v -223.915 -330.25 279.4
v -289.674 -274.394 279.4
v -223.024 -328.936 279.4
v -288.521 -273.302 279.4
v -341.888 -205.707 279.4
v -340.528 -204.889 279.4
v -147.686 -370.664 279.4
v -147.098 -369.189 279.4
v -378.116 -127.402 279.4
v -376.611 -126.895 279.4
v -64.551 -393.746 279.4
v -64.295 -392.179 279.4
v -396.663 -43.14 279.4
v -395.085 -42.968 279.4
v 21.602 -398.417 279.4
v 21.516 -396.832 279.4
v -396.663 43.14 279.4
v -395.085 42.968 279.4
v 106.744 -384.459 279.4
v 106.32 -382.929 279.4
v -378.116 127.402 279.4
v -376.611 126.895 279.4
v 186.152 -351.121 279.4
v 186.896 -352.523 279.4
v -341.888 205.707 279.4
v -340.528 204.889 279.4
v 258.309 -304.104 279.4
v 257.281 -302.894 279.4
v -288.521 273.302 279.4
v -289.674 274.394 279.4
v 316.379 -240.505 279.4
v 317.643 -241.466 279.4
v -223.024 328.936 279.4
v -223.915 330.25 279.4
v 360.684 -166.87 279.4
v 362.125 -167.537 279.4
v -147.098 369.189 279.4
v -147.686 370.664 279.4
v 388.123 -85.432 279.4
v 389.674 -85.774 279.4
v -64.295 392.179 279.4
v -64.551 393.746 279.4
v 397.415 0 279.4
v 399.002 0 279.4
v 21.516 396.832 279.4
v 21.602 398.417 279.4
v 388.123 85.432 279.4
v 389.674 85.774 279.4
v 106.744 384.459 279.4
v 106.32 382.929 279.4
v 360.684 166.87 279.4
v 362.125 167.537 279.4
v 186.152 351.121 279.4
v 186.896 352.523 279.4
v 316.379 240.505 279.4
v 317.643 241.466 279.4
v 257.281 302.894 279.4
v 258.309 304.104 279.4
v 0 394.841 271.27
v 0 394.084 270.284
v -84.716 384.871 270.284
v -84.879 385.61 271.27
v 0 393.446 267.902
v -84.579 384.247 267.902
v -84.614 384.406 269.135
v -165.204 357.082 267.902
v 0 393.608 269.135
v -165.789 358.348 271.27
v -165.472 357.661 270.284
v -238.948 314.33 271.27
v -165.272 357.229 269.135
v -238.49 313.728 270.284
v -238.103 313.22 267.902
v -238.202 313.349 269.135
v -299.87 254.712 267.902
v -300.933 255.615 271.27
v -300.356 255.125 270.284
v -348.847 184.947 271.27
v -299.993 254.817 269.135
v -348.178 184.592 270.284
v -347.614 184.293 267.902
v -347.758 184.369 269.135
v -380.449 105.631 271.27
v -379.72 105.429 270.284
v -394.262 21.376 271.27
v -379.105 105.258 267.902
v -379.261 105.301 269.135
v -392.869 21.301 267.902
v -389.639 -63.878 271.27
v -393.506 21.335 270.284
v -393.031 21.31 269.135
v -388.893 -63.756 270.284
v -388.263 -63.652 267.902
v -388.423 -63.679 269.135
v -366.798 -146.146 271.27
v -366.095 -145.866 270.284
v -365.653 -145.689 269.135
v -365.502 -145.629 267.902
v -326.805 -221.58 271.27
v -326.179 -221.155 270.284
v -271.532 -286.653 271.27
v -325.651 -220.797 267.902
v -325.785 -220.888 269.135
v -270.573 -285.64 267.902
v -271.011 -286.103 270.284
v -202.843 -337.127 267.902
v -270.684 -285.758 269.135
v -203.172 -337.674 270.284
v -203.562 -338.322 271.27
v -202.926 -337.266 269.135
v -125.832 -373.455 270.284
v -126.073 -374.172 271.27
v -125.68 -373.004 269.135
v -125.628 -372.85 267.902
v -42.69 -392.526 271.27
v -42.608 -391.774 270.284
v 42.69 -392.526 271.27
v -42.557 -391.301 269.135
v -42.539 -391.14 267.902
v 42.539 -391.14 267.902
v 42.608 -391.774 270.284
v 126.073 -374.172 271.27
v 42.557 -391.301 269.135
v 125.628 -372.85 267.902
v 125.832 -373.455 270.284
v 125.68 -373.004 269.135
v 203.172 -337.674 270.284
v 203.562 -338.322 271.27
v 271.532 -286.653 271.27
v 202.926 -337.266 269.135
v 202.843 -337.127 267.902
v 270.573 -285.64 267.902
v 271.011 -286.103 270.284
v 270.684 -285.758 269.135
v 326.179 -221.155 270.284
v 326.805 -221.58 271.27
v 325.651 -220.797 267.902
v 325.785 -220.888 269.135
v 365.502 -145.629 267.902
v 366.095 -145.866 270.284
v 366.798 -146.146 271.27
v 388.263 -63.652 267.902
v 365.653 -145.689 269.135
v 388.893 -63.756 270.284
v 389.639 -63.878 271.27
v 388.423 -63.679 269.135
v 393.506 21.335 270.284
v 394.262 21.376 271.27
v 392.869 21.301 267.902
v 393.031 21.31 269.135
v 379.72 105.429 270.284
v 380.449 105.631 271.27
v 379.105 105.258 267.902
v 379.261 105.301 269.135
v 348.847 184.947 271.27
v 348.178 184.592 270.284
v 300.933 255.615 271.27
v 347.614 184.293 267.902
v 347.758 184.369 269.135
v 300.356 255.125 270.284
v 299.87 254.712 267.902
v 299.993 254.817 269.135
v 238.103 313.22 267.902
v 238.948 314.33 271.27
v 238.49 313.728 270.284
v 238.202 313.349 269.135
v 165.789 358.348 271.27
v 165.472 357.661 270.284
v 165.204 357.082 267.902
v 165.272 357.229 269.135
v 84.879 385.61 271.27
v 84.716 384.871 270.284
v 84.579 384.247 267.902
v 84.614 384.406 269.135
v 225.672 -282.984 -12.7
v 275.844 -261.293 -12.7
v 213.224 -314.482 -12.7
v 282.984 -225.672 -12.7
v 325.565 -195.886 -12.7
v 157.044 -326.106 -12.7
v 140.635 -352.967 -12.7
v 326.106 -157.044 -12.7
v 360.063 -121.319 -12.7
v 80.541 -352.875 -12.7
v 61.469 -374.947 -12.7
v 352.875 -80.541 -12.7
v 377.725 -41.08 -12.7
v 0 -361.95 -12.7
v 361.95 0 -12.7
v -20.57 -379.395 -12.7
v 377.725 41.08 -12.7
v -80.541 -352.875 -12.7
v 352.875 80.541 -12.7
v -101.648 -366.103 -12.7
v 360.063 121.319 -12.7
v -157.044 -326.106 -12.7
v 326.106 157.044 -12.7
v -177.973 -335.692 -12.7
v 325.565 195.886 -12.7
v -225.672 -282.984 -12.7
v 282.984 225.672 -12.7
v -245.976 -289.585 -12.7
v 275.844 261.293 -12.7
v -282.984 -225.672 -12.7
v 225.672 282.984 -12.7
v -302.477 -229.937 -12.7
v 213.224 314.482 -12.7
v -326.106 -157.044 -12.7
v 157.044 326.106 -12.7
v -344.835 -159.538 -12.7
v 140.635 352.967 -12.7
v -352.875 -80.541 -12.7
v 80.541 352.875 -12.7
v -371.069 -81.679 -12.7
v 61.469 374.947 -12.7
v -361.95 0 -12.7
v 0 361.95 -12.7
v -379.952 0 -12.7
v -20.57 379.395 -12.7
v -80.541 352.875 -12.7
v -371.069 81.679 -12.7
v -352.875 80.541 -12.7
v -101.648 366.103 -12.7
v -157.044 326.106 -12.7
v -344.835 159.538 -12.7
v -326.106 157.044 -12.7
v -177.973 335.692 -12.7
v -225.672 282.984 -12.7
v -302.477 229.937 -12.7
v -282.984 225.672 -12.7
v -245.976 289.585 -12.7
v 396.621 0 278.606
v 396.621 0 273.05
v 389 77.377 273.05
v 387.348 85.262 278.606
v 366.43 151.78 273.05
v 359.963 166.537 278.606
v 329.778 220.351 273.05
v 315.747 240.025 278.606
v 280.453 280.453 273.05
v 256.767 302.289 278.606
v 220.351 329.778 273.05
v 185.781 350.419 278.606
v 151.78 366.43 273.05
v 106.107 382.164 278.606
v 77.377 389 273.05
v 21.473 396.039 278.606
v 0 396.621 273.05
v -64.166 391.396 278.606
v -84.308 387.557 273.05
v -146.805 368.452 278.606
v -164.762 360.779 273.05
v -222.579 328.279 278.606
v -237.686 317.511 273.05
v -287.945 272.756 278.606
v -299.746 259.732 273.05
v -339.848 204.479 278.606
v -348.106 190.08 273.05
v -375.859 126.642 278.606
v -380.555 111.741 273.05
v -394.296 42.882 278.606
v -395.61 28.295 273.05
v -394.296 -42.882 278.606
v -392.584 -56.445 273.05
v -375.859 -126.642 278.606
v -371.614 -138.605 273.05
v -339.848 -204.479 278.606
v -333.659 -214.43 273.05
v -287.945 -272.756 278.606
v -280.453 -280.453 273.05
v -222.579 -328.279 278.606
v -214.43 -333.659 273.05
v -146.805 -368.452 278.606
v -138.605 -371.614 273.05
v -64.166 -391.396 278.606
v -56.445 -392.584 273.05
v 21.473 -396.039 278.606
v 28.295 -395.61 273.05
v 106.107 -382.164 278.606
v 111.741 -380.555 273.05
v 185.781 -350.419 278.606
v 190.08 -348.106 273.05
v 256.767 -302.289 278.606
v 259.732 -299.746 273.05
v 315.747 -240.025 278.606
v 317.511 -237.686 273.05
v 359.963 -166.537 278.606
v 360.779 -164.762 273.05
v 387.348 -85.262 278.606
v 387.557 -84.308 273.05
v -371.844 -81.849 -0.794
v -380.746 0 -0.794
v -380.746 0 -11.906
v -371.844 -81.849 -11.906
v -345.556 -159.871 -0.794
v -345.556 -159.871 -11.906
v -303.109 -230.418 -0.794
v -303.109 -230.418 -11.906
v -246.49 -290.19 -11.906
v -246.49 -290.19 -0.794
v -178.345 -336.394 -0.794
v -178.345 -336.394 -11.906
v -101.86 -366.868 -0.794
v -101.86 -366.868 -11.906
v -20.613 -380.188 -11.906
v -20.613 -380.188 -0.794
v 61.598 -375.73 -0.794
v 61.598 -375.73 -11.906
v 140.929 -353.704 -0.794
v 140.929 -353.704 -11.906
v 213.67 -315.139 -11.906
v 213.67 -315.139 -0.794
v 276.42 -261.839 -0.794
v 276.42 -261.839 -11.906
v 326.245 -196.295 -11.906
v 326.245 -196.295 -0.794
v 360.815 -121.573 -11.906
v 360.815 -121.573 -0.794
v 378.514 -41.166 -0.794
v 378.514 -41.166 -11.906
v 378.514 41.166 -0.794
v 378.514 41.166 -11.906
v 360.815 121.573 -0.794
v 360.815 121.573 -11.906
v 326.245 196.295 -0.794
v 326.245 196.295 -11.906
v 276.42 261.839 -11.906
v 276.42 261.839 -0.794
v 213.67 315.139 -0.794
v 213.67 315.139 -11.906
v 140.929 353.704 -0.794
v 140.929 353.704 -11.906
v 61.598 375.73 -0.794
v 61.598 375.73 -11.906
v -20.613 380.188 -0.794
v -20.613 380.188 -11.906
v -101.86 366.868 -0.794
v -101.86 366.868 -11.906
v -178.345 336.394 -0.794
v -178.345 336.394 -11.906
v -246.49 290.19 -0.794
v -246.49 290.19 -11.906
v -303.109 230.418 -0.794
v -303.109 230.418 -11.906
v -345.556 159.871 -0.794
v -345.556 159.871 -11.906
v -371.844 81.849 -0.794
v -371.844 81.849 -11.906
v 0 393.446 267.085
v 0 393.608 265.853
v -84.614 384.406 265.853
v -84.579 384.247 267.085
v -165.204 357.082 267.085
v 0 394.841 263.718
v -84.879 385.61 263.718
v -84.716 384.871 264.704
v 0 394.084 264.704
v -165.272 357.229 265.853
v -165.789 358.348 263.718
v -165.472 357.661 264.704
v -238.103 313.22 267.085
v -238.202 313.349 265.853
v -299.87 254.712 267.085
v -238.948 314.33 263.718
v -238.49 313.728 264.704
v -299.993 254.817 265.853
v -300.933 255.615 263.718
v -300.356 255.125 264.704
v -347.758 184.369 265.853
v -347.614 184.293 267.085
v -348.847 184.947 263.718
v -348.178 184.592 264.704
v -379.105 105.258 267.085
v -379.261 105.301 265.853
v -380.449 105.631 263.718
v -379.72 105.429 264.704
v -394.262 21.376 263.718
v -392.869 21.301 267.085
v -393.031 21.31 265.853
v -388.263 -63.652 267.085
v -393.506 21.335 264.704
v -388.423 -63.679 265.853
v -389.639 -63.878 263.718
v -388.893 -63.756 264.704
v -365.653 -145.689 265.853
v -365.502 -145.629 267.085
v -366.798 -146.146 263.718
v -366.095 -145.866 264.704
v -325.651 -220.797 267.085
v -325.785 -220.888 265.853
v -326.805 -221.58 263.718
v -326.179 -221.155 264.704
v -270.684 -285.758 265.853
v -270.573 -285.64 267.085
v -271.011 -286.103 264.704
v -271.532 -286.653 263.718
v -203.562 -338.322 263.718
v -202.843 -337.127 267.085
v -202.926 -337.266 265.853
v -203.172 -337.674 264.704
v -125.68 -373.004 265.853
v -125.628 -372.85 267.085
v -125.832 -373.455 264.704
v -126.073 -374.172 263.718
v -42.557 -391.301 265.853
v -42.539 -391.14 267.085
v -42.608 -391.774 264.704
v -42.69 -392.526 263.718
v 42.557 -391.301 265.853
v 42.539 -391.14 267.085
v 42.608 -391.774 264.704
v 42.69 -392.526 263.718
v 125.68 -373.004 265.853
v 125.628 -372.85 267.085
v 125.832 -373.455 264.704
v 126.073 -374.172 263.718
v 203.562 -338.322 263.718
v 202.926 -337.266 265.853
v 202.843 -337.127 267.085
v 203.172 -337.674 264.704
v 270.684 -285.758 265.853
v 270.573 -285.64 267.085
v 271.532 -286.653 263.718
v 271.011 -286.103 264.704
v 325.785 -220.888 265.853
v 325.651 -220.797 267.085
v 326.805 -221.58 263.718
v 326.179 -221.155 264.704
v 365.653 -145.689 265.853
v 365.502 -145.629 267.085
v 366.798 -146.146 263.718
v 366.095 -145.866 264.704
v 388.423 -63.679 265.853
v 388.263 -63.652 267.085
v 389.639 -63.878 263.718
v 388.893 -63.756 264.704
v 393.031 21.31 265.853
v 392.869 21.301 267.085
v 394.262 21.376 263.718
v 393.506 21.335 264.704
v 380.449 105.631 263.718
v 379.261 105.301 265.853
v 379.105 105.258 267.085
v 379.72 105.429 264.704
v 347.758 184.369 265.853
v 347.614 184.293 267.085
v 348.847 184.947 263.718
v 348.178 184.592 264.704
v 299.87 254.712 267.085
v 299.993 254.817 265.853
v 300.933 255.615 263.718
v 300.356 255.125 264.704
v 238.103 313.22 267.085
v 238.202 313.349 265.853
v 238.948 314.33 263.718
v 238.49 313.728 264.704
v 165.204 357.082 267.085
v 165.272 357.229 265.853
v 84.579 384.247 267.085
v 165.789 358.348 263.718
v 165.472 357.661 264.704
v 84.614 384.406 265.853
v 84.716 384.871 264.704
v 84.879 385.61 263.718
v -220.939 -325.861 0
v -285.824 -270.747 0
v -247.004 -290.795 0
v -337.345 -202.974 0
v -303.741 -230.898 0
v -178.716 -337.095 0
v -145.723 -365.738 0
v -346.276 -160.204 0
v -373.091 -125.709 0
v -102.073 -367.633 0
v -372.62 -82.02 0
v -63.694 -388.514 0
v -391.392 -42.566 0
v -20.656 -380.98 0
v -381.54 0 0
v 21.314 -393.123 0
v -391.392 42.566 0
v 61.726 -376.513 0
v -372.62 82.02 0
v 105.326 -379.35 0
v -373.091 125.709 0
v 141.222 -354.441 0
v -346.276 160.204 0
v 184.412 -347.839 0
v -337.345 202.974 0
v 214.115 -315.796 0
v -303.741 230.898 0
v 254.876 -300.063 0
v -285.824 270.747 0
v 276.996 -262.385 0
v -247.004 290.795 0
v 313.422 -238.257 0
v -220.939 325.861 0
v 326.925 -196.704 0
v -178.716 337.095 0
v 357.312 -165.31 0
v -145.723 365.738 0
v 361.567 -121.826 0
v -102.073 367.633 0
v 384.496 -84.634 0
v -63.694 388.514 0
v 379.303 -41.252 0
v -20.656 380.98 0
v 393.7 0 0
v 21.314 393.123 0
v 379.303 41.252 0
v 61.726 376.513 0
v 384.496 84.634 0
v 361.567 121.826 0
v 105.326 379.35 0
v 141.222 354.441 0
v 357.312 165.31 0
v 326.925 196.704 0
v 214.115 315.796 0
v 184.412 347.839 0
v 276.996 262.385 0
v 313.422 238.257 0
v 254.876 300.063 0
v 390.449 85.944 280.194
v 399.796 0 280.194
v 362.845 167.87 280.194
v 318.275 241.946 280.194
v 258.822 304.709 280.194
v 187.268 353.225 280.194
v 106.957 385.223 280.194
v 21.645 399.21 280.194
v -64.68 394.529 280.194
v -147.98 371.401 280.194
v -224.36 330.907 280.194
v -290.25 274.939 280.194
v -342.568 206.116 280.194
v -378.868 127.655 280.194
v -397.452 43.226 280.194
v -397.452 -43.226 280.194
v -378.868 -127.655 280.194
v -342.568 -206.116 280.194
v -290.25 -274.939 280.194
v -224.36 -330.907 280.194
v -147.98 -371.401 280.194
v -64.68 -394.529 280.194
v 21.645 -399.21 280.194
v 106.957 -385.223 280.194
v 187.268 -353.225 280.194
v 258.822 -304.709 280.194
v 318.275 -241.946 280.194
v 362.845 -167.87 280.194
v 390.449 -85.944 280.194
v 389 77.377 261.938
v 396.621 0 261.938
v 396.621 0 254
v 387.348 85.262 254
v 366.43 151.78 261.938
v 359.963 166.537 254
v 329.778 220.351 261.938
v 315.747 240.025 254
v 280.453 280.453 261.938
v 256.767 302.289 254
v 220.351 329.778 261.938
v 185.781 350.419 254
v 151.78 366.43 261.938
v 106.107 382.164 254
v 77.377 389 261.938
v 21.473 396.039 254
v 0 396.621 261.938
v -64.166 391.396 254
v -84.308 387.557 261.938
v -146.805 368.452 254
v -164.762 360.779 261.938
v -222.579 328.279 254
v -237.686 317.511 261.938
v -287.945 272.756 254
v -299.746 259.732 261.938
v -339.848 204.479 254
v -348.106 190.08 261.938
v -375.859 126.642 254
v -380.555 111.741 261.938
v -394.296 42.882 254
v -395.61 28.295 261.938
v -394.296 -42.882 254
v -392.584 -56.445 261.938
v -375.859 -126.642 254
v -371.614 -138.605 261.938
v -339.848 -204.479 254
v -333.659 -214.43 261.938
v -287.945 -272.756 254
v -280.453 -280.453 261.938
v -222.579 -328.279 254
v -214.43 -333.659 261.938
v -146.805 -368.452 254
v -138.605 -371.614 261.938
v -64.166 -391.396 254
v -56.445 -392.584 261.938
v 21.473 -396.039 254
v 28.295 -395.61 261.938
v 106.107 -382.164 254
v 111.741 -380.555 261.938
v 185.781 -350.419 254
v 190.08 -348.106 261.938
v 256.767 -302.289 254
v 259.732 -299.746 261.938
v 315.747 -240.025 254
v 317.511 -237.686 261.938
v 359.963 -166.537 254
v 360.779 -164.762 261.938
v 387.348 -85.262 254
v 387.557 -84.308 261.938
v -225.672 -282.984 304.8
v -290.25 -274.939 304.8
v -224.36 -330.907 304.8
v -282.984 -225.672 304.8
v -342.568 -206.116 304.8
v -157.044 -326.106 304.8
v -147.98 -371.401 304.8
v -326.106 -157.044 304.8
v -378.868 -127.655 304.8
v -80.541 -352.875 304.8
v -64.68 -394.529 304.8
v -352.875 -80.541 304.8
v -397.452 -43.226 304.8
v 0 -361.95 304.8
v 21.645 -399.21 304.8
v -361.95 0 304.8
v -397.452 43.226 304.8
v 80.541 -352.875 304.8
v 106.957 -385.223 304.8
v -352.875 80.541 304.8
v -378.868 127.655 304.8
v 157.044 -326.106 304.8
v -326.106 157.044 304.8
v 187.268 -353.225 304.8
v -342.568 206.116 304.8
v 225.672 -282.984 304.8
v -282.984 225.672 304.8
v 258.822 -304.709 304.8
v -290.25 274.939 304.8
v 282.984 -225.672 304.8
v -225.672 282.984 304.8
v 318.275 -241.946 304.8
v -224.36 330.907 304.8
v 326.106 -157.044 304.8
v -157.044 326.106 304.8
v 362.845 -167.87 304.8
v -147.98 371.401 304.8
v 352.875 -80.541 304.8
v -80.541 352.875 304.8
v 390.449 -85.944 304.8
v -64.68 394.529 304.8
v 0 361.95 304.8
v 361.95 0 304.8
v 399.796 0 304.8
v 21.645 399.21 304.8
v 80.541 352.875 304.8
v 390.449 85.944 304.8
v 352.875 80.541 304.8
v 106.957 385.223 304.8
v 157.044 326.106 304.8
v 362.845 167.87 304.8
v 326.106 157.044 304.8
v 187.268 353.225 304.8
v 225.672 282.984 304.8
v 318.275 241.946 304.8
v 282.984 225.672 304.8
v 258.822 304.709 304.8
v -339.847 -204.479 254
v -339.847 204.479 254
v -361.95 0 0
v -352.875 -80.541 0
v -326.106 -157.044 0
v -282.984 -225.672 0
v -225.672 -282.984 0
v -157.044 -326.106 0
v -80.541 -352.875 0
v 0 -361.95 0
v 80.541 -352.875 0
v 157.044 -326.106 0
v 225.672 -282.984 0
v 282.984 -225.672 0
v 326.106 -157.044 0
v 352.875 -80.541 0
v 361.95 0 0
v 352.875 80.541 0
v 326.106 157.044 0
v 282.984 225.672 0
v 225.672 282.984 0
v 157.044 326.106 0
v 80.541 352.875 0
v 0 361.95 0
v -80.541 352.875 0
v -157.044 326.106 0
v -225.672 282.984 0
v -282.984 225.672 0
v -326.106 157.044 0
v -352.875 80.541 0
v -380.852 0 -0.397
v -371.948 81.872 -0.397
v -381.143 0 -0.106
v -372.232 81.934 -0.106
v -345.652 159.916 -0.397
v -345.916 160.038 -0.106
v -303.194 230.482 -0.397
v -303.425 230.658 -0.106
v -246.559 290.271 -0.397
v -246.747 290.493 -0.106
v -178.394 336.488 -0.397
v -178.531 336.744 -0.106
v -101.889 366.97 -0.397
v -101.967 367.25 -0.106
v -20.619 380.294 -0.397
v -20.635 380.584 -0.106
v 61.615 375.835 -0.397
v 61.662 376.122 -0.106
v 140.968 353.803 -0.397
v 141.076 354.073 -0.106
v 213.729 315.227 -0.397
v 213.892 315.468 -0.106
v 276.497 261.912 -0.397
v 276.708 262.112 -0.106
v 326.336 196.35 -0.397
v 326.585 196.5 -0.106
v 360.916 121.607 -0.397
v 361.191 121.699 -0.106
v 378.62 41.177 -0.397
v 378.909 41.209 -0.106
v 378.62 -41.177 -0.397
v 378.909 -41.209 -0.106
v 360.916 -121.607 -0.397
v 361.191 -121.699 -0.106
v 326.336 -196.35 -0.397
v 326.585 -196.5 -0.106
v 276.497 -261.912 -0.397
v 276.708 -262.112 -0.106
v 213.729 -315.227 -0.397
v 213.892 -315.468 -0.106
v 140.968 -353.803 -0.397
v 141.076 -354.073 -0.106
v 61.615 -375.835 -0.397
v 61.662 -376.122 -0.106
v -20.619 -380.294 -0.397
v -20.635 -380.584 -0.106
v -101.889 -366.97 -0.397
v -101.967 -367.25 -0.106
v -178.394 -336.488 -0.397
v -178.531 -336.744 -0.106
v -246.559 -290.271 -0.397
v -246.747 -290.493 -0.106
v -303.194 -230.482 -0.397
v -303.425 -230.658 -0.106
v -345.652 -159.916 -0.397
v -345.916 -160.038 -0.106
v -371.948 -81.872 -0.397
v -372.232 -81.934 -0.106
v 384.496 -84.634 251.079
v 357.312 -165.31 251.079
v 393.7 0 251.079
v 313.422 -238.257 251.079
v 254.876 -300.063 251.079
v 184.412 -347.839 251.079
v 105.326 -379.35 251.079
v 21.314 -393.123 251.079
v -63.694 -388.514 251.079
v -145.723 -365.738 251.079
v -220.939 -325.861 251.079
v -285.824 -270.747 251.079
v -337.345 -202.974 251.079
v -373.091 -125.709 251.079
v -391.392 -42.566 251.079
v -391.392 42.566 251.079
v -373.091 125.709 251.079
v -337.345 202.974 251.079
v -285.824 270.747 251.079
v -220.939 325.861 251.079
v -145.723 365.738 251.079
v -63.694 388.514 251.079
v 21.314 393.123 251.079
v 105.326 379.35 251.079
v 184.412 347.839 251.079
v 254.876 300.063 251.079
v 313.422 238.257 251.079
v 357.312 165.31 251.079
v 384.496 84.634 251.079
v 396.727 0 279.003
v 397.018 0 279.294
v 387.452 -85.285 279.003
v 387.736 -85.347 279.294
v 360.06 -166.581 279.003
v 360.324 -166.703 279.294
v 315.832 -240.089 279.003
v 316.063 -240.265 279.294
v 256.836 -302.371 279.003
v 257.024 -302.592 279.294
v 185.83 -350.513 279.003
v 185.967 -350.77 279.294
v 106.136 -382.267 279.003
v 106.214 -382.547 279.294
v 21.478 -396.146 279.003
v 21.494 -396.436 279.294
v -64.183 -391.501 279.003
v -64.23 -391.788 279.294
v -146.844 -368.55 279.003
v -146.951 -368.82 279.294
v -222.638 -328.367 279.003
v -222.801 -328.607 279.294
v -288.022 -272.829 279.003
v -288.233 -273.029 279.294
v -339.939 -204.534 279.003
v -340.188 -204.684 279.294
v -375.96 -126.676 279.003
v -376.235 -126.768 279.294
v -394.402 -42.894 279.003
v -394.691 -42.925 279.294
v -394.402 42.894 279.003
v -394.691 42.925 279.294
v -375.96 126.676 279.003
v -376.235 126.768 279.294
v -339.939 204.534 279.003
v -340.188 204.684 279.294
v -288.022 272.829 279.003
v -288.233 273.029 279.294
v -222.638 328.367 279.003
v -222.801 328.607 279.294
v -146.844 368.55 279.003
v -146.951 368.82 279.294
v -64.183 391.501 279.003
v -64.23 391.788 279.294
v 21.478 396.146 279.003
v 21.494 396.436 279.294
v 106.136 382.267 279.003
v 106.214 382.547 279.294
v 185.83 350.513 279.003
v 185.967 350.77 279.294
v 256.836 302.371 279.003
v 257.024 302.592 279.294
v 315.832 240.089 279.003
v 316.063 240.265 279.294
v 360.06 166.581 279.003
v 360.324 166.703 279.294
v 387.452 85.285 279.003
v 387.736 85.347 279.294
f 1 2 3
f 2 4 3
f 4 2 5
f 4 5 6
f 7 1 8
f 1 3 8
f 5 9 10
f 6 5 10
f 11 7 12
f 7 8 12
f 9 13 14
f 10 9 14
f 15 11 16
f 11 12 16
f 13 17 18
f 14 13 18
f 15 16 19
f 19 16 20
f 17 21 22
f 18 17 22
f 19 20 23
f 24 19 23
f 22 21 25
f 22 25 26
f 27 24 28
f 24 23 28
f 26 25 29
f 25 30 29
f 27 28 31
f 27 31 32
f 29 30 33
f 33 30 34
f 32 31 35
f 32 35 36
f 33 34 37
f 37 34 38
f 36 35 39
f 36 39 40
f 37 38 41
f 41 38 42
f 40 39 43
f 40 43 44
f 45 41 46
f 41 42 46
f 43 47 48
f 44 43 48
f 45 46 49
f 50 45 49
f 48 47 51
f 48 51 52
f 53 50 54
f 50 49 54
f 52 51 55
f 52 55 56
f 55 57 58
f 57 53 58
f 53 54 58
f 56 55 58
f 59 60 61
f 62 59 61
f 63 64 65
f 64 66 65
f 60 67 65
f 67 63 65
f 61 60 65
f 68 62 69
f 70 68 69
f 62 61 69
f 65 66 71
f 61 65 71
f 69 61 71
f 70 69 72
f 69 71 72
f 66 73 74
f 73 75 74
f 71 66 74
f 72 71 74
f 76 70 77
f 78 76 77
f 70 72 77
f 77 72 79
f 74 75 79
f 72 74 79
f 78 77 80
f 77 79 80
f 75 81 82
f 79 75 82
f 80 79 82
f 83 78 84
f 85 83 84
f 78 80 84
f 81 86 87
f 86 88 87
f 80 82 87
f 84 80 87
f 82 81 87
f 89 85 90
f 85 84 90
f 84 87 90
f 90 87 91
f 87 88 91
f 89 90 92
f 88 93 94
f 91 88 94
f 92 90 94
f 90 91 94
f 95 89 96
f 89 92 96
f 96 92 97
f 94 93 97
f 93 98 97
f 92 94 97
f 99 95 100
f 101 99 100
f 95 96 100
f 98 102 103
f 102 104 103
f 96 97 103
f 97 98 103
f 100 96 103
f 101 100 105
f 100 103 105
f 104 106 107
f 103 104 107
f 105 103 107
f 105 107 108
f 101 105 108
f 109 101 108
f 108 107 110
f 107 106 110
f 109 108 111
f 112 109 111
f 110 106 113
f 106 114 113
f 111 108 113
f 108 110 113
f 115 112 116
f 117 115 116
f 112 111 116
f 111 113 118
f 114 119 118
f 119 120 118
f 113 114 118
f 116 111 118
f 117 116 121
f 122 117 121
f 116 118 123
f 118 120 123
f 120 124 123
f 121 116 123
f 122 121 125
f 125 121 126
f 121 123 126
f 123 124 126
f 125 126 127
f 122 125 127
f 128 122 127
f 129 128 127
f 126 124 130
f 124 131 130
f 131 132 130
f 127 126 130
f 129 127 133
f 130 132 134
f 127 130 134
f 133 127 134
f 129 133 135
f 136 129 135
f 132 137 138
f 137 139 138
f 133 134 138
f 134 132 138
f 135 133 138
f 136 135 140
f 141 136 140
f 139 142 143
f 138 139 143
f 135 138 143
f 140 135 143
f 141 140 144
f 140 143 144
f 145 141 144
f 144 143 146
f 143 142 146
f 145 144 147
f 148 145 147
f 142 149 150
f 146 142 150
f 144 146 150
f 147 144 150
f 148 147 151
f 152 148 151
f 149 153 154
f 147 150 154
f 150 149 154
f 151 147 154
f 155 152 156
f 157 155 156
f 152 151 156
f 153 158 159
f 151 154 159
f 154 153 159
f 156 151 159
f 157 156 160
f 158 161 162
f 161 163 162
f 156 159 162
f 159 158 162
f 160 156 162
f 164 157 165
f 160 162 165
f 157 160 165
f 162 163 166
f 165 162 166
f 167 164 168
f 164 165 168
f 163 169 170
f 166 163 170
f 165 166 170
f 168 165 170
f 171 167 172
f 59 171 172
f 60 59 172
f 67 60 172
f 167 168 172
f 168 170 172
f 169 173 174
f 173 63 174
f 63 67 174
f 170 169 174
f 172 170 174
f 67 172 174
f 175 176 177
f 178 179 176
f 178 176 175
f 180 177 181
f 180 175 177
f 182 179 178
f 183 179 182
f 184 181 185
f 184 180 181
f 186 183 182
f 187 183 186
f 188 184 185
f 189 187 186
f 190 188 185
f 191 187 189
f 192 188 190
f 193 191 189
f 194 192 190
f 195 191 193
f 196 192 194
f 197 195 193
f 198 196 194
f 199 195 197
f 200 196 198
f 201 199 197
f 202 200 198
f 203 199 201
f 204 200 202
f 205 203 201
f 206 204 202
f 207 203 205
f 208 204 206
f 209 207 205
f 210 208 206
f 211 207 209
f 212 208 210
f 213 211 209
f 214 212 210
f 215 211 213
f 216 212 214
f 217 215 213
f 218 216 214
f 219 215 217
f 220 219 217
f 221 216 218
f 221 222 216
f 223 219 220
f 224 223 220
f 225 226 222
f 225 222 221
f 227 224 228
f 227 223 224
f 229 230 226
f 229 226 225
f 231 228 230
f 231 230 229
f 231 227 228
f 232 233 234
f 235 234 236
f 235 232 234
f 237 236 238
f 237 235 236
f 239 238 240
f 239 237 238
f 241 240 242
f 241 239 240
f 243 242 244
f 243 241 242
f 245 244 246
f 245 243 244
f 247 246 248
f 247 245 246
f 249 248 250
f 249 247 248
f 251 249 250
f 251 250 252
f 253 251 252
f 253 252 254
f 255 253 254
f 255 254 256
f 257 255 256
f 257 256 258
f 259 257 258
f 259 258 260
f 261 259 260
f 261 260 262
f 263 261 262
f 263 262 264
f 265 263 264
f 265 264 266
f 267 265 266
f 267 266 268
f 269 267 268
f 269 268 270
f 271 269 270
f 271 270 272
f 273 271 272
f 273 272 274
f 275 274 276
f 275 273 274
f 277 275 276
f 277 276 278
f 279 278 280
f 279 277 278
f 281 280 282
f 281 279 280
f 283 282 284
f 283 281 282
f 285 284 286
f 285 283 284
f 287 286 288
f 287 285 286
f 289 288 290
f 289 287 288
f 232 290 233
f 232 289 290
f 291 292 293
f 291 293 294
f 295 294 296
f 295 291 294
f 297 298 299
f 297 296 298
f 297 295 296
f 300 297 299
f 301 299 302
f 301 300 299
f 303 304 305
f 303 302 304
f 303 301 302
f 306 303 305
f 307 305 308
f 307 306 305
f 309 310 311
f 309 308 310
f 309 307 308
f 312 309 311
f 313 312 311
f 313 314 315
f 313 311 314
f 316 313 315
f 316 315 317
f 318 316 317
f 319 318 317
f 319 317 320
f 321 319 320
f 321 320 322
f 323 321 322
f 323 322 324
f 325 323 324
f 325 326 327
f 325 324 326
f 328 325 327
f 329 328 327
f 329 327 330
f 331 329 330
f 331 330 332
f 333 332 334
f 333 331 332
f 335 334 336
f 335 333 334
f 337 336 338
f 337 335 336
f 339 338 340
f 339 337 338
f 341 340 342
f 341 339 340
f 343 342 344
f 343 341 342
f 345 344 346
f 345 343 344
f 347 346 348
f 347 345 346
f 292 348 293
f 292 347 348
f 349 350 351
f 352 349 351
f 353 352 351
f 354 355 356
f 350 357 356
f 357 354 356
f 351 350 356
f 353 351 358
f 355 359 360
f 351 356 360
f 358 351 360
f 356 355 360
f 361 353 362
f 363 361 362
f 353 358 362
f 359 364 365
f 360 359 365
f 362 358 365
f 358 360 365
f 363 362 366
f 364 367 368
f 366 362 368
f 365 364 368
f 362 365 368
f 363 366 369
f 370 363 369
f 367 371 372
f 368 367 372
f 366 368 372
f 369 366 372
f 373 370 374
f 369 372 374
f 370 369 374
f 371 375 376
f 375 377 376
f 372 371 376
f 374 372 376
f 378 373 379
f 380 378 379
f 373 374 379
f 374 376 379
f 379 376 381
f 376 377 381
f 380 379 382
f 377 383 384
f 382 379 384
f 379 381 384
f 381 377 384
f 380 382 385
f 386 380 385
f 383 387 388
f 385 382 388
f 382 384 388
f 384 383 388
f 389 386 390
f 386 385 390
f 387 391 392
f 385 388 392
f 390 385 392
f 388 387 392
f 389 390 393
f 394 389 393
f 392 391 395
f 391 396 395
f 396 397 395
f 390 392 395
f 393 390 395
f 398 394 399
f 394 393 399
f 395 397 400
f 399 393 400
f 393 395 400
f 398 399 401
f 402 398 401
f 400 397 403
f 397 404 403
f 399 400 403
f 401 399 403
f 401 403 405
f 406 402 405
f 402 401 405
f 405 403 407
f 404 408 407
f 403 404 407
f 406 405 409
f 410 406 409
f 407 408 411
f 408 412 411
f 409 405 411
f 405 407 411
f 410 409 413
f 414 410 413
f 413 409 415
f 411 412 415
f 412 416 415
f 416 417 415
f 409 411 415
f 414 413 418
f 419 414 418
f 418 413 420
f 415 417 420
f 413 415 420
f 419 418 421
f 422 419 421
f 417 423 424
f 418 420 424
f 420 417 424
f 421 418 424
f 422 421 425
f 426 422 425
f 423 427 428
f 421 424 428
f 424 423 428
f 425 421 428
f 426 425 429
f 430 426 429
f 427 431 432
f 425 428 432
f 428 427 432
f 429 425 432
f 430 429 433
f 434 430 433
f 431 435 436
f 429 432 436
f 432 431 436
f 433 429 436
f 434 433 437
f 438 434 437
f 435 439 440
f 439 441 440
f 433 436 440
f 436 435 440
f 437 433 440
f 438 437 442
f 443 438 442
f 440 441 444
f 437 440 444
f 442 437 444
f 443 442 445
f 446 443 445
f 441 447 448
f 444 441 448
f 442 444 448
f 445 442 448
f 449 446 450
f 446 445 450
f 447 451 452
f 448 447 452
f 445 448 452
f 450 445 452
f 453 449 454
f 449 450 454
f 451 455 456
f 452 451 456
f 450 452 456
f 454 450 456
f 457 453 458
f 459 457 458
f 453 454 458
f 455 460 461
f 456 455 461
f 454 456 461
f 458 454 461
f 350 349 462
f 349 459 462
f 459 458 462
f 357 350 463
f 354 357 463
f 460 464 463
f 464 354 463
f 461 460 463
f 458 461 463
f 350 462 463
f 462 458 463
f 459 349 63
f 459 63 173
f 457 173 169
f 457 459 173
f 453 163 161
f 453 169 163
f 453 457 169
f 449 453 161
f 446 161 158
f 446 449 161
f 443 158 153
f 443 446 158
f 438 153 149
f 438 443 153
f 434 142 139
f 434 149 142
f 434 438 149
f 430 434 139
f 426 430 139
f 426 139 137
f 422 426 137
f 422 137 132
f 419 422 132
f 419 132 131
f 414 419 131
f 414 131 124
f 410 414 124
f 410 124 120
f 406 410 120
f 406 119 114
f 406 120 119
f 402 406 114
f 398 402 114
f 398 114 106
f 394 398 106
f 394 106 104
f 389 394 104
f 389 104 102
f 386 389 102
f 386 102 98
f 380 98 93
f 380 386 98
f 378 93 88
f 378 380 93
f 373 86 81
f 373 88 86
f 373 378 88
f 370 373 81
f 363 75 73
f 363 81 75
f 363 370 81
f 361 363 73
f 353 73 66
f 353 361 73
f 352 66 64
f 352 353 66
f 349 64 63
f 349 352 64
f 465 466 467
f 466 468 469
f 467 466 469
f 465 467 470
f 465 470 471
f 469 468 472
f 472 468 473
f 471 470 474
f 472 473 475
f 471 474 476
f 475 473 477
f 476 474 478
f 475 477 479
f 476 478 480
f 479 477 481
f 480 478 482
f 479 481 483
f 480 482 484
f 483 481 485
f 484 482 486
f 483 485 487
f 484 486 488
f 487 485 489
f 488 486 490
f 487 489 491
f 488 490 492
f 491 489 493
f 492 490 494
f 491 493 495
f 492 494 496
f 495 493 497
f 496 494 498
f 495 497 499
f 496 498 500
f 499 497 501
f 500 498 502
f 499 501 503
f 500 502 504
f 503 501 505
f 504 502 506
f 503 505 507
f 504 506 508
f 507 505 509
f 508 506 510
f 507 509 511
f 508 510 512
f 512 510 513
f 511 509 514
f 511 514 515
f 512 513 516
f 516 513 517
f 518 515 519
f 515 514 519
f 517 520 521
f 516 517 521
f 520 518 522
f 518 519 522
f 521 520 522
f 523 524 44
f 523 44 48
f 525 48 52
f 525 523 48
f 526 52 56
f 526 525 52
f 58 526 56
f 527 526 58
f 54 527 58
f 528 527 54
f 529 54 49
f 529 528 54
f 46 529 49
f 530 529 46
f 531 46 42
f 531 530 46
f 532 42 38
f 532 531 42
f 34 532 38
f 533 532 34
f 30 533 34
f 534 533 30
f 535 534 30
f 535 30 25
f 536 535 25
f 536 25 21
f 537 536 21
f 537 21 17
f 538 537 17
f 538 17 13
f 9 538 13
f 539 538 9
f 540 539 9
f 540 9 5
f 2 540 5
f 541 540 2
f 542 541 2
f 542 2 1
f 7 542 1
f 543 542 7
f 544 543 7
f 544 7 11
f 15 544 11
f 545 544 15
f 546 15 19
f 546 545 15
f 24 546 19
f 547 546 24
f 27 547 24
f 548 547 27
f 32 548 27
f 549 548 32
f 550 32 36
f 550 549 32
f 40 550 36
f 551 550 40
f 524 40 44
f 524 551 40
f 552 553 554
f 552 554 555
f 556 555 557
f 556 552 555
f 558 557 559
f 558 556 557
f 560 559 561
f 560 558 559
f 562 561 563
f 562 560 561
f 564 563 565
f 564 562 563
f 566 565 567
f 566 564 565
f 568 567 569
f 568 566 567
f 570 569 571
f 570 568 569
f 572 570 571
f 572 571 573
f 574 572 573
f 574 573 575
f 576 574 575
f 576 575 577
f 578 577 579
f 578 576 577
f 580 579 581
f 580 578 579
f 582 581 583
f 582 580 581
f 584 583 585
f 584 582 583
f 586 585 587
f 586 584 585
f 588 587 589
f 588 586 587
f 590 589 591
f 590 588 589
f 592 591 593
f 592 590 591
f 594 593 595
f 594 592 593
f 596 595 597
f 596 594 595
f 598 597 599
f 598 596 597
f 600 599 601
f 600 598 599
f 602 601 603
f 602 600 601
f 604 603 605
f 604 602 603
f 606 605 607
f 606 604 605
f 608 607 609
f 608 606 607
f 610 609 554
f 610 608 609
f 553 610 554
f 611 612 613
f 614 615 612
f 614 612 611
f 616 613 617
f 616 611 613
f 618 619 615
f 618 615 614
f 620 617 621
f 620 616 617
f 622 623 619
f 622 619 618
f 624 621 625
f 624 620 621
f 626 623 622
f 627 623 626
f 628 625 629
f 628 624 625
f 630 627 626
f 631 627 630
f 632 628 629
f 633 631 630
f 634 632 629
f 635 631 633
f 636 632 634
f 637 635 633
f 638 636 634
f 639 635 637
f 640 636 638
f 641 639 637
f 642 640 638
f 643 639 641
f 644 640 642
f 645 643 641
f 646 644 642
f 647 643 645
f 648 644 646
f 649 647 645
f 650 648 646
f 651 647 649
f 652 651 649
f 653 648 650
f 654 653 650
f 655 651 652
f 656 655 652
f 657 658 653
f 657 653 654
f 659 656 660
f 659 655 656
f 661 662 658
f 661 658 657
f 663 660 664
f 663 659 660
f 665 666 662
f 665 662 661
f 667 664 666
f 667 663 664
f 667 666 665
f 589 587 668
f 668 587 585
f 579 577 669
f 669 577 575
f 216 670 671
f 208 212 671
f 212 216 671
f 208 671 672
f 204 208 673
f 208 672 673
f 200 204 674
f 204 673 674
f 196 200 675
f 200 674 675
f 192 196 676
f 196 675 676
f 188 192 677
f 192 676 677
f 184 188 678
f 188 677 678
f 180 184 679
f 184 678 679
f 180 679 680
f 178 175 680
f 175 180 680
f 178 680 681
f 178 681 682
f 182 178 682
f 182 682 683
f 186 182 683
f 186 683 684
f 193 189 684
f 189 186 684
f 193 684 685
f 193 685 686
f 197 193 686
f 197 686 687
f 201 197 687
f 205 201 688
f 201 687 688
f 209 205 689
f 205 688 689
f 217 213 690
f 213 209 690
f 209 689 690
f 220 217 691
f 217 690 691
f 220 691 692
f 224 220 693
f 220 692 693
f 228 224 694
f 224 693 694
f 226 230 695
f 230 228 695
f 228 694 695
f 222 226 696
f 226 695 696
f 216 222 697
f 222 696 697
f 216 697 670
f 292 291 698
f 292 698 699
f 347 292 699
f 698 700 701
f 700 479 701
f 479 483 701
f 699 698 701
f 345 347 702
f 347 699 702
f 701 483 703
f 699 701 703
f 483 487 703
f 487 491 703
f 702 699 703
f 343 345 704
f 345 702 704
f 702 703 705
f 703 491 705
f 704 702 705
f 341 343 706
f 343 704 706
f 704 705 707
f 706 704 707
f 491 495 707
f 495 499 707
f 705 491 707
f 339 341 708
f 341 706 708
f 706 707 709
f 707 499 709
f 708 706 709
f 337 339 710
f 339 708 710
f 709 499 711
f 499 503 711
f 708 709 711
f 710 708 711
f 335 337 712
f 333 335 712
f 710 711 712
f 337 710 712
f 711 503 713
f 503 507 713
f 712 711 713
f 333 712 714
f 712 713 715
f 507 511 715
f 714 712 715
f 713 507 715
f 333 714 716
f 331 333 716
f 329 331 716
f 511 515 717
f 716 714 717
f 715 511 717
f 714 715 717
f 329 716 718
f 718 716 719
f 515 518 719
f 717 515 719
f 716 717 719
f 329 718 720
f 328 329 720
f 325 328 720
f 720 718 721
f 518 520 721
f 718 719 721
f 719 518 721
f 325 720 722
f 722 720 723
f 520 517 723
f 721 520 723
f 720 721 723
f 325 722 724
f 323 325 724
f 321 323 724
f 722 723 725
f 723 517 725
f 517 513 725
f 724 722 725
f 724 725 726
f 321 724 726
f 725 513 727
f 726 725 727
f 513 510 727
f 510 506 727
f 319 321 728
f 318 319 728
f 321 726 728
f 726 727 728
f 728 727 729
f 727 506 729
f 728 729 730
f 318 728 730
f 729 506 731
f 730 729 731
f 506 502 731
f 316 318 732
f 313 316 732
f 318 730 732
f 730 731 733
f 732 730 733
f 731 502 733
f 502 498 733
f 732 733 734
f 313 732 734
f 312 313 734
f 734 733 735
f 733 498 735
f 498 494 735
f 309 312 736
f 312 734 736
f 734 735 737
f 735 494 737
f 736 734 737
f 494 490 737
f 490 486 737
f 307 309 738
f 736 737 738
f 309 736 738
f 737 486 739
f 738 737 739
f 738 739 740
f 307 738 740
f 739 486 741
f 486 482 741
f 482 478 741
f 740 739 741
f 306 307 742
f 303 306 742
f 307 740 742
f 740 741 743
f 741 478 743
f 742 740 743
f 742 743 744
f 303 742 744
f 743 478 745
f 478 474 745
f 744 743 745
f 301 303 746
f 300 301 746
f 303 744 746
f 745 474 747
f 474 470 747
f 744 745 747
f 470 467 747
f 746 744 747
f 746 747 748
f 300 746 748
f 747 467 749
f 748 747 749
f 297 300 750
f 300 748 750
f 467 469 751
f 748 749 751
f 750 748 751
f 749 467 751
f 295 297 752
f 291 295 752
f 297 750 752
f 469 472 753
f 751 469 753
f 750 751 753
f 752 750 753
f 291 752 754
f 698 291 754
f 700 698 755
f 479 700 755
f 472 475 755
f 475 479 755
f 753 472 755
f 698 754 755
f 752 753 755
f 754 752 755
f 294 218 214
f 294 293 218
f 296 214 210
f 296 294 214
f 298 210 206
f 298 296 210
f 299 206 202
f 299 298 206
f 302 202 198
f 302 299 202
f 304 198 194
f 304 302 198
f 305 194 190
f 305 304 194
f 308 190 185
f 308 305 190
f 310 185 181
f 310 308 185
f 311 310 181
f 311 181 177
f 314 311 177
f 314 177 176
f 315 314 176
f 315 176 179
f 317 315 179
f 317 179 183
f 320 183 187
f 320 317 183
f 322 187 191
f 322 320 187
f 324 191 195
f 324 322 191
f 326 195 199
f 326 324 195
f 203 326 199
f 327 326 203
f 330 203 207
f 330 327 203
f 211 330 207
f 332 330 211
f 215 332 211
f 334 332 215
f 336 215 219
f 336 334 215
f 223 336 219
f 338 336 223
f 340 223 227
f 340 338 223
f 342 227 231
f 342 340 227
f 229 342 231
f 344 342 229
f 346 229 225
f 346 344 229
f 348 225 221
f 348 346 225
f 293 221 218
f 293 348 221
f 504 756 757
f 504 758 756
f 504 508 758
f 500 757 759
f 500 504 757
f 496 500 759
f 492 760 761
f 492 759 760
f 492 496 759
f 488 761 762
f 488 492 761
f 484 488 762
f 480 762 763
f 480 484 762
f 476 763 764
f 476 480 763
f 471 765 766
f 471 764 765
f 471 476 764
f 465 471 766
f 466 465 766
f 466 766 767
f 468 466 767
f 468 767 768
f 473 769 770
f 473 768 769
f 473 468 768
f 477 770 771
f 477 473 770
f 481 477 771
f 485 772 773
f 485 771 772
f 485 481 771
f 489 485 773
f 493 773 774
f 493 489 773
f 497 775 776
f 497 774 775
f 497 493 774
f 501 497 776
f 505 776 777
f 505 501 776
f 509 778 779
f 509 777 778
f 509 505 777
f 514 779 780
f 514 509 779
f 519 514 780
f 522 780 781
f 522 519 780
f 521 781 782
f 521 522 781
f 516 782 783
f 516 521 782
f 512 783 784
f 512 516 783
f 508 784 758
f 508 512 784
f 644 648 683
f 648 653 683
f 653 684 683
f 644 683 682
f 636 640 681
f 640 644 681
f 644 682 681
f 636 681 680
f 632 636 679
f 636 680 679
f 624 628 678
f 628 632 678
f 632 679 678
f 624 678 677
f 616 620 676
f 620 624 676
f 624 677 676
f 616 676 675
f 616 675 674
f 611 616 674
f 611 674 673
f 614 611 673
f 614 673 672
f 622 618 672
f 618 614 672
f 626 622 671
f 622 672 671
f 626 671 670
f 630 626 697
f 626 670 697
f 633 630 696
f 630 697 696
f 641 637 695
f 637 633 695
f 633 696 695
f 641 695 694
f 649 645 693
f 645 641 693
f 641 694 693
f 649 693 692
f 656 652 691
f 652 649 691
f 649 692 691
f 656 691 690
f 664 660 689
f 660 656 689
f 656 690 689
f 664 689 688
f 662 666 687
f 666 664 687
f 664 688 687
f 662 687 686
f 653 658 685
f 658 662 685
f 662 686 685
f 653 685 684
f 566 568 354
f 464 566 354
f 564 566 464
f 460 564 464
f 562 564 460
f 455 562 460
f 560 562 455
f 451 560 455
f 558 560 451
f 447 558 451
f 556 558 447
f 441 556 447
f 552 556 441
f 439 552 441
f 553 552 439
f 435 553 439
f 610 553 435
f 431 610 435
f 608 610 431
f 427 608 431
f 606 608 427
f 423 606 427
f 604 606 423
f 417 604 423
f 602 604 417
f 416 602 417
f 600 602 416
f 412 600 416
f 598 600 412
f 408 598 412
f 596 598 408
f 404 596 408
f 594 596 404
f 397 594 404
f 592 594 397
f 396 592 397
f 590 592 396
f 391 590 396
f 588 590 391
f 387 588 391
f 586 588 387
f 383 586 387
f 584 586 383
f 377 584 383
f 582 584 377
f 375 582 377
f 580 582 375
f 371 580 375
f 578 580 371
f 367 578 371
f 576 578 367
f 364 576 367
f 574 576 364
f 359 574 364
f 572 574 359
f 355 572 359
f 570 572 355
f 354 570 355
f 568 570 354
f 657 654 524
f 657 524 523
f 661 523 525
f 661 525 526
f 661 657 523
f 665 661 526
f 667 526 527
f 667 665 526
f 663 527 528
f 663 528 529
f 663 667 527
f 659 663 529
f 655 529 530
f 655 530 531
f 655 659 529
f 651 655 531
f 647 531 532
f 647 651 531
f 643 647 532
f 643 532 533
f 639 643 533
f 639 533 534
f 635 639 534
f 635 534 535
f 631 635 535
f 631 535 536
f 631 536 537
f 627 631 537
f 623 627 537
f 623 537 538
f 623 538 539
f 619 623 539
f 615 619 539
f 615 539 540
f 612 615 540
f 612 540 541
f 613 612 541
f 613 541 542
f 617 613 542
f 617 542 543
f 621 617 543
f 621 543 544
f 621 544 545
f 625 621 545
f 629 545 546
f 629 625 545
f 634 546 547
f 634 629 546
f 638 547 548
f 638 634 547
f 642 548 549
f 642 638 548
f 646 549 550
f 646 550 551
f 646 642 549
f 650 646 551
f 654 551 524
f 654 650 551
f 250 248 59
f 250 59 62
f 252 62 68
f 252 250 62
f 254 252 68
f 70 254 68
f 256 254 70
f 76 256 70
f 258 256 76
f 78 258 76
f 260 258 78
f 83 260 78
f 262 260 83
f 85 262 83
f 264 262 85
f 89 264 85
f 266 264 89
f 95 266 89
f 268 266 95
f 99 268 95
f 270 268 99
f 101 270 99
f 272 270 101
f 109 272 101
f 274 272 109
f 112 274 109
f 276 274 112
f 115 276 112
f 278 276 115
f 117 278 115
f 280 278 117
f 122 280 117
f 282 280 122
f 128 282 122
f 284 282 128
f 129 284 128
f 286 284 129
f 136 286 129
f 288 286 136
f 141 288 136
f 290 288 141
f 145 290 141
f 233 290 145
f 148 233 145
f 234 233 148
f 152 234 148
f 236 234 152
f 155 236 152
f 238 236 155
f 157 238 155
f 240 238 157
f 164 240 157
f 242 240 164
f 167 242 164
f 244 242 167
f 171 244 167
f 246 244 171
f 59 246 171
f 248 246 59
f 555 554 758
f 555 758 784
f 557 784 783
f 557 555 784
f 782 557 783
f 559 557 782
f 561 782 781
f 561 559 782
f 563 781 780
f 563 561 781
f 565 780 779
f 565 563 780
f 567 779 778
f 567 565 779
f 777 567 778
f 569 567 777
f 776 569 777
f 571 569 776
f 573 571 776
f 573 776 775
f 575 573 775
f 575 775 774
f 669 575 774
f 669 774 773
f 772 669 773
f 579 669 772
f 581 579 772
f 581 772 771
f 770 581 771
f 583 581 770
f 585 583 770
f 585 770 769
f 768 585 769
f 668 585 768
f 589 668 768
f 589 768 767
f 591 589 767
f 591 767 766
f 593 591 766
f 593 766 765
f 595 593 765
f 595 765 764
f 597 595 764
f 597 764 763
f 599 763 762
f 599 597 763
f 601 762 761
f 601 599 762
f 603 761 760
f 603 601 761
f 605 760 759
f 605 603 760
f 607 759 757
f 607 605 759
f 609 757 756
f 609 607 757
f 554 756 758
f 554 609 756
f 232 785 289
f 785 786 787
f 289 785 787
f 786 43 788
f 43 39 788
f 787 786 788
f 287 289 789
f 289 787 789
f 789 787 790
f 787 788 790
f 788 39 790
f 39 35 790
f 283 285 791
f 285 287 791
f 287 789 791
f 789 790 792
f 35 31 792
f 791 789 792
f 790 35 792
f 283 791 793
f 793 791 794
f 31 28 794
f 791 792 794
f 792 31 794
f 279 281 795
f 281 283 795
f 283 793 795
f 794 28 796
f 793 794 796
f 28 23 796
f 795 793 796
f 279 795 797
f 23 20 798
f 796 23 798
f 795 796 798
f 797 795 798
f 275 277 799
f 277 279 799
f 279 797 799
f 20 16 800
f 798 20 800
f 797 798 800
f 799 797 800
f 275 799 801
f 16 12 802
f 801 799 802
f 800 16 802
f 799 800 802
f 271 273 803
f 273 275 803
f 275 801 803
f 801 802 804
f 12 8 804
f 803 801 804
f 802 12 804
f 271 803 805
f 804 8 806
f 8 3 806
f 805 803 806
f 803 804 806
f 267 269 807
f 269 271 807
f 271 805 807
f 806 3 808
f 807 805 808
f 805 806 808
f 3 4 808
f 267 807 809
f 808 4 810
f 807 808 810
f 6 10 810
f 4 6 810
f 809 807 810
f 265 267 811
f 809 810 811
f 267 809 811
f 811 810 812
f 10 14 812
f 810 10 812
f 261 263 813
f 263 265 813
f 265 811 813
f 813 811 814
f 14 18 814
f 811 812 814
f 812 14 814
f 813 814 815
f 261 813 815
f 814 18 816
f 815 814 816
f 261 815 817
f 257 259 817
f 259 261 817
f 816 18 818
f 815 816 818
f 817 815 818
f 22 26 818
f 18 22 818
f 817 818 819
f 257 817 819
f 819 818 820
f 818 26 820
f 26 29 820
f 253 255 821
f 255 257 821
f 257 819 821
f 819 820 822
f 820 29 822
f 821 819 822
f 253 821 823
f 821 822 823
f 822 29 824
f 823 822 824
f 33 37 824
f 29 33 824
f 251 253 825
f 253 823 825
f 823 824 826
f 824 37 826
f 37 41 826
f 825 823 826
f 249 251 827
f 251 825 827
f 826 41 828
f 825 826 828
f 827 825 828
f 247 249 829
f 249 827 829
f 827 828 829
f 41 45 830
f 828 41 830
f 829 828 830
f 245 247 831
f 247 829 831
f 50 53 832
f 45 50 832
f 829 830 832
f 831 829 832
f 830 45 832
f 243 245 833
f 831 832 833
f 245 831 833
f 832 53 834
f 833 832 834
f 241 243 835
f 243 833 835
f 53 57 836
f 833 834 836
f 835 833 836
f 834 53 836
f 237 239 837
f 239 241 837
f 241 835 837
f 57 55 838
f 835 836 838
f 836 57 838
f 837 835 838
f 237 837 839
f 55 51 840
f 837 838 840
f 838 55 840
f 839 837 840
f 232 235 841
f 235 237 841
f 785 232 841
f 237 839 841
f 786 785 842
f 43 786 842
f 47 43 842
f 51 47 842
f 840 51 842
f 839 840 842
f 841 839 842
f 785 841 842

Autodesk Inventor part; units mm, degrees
ref_plane "YZ Plane" through (0, 0, 0) normal (1, 0, 0) x (0, 1, 0)
ref_plane "XZ Plane" through (0, 0, 0) normal (0, 1, 0) x (-1, 0, 0)
ref_plane "XY Plane" through (0, 0, 0) normal (0, 0, 1) x (1, 0, 0)
sketch "Sketch1" plane through (0, 0, 0) normal (0, 0, 1) x (1, 0, 0)
  circle A0 centre (0, 0) radius 361.95
  circle A1 centre (0, 0) radius 393.7
  dimension "d0" = 723.9
  dimension "d1" = 787.4
extrude "Extrusion1" add sketch "Sketch1" along normal blind 304.8
sketch "Sketch2" plane through (0, 0, 304.8) normal (0, 0, 1) x (1, 0, 0)
  circle A0 centre (0, 0) radius 393.7 projected
  circle A1 centre (0, 0) radius 396.621
  circle A2 centre (0, 0) radius 399.796
  dimension "d4" = 793.242
  dimension "d5" = 799.592
extrude "Extrusion2" add sketch "Sketch2" against normal blind 50.8 contours A1
extrude "Extrusion3" add sketch "Sketch2" against normal blind 25.4 contours A2
chamfer "Chamfer1" distance 2.921 angle 45 1 edges at (-393.7, 0, 254)
sketch "Sketch3" plane through (0, 0, 0) normal (0, 0, -1) x (-1, 0, 0)
  circle A0 centre (0, 0) radius 380.746
  circle A1 centre (0, 0) radius 361.95 projected
  dimension "d13" = 761.492
extrude "Extrusion4" add sketch "Sketch3" along normal blind 12.7
fillet "Fillet1" radius 0.7937 2 edges at (380.746, 0, 0) (-396.621, 0, 279.4)
chamfer "Chamfer2" distance 0.7937 angle 45 1 edges at (380.746, 0, -12.7)
chamfer "Chamfer3" distance 0.7937 angle 45 1 edges at (-399.796, 0, 279.4)
sketch "Sketch4" plane through (0, 0, 0) normal (1, 0, 0) x (0, 1, 0)
  line L0 (396.621, 278.6062) -> (396.621, 254) construction
  line L1 (-399.796, 304.8) -> (399.796, 304.8) construction
  line L2 (396.621, 273.05) -> (394.8409, 271.2699)
  arc A0 (394.8409, 271.2699) -> (393.446, 267.9023) centre (398.2085, 267.9023) ccw
  line L3 (393.446, 267.9023) -> (393.446, 267.0852)
  arc A1 (393.446, 267.0852) -> (394.8409, 263.7176) centre (398.2085, 267.0852) ccw
  line L4 (394.8409, 263.7176) -> (396.621, 261.9375)
  line L5 (396.621, 261.9375) -> (396.621, 273.05)
  line L6 (0, -60.96) -> (0, 365.76) projected
  point P0 (0, 0)
  dimension "d23" = 11.1125
  dimension "d24" = 3.175
  dimension "d25" = 4.7625
  dimension "d26" = 31.75
  dimension "d27" = 45
revolve "Revolution1" cut sketch "Sketch4" angle 360 about axis through (0, 0, -10) along (0, 0, 1)
equation "\"d10\" = -0.5 * d1 + 0.5 * d4"
properties part number "A1-19037-200-06 HCWI liner - pup" material "Iron, HCWI"
